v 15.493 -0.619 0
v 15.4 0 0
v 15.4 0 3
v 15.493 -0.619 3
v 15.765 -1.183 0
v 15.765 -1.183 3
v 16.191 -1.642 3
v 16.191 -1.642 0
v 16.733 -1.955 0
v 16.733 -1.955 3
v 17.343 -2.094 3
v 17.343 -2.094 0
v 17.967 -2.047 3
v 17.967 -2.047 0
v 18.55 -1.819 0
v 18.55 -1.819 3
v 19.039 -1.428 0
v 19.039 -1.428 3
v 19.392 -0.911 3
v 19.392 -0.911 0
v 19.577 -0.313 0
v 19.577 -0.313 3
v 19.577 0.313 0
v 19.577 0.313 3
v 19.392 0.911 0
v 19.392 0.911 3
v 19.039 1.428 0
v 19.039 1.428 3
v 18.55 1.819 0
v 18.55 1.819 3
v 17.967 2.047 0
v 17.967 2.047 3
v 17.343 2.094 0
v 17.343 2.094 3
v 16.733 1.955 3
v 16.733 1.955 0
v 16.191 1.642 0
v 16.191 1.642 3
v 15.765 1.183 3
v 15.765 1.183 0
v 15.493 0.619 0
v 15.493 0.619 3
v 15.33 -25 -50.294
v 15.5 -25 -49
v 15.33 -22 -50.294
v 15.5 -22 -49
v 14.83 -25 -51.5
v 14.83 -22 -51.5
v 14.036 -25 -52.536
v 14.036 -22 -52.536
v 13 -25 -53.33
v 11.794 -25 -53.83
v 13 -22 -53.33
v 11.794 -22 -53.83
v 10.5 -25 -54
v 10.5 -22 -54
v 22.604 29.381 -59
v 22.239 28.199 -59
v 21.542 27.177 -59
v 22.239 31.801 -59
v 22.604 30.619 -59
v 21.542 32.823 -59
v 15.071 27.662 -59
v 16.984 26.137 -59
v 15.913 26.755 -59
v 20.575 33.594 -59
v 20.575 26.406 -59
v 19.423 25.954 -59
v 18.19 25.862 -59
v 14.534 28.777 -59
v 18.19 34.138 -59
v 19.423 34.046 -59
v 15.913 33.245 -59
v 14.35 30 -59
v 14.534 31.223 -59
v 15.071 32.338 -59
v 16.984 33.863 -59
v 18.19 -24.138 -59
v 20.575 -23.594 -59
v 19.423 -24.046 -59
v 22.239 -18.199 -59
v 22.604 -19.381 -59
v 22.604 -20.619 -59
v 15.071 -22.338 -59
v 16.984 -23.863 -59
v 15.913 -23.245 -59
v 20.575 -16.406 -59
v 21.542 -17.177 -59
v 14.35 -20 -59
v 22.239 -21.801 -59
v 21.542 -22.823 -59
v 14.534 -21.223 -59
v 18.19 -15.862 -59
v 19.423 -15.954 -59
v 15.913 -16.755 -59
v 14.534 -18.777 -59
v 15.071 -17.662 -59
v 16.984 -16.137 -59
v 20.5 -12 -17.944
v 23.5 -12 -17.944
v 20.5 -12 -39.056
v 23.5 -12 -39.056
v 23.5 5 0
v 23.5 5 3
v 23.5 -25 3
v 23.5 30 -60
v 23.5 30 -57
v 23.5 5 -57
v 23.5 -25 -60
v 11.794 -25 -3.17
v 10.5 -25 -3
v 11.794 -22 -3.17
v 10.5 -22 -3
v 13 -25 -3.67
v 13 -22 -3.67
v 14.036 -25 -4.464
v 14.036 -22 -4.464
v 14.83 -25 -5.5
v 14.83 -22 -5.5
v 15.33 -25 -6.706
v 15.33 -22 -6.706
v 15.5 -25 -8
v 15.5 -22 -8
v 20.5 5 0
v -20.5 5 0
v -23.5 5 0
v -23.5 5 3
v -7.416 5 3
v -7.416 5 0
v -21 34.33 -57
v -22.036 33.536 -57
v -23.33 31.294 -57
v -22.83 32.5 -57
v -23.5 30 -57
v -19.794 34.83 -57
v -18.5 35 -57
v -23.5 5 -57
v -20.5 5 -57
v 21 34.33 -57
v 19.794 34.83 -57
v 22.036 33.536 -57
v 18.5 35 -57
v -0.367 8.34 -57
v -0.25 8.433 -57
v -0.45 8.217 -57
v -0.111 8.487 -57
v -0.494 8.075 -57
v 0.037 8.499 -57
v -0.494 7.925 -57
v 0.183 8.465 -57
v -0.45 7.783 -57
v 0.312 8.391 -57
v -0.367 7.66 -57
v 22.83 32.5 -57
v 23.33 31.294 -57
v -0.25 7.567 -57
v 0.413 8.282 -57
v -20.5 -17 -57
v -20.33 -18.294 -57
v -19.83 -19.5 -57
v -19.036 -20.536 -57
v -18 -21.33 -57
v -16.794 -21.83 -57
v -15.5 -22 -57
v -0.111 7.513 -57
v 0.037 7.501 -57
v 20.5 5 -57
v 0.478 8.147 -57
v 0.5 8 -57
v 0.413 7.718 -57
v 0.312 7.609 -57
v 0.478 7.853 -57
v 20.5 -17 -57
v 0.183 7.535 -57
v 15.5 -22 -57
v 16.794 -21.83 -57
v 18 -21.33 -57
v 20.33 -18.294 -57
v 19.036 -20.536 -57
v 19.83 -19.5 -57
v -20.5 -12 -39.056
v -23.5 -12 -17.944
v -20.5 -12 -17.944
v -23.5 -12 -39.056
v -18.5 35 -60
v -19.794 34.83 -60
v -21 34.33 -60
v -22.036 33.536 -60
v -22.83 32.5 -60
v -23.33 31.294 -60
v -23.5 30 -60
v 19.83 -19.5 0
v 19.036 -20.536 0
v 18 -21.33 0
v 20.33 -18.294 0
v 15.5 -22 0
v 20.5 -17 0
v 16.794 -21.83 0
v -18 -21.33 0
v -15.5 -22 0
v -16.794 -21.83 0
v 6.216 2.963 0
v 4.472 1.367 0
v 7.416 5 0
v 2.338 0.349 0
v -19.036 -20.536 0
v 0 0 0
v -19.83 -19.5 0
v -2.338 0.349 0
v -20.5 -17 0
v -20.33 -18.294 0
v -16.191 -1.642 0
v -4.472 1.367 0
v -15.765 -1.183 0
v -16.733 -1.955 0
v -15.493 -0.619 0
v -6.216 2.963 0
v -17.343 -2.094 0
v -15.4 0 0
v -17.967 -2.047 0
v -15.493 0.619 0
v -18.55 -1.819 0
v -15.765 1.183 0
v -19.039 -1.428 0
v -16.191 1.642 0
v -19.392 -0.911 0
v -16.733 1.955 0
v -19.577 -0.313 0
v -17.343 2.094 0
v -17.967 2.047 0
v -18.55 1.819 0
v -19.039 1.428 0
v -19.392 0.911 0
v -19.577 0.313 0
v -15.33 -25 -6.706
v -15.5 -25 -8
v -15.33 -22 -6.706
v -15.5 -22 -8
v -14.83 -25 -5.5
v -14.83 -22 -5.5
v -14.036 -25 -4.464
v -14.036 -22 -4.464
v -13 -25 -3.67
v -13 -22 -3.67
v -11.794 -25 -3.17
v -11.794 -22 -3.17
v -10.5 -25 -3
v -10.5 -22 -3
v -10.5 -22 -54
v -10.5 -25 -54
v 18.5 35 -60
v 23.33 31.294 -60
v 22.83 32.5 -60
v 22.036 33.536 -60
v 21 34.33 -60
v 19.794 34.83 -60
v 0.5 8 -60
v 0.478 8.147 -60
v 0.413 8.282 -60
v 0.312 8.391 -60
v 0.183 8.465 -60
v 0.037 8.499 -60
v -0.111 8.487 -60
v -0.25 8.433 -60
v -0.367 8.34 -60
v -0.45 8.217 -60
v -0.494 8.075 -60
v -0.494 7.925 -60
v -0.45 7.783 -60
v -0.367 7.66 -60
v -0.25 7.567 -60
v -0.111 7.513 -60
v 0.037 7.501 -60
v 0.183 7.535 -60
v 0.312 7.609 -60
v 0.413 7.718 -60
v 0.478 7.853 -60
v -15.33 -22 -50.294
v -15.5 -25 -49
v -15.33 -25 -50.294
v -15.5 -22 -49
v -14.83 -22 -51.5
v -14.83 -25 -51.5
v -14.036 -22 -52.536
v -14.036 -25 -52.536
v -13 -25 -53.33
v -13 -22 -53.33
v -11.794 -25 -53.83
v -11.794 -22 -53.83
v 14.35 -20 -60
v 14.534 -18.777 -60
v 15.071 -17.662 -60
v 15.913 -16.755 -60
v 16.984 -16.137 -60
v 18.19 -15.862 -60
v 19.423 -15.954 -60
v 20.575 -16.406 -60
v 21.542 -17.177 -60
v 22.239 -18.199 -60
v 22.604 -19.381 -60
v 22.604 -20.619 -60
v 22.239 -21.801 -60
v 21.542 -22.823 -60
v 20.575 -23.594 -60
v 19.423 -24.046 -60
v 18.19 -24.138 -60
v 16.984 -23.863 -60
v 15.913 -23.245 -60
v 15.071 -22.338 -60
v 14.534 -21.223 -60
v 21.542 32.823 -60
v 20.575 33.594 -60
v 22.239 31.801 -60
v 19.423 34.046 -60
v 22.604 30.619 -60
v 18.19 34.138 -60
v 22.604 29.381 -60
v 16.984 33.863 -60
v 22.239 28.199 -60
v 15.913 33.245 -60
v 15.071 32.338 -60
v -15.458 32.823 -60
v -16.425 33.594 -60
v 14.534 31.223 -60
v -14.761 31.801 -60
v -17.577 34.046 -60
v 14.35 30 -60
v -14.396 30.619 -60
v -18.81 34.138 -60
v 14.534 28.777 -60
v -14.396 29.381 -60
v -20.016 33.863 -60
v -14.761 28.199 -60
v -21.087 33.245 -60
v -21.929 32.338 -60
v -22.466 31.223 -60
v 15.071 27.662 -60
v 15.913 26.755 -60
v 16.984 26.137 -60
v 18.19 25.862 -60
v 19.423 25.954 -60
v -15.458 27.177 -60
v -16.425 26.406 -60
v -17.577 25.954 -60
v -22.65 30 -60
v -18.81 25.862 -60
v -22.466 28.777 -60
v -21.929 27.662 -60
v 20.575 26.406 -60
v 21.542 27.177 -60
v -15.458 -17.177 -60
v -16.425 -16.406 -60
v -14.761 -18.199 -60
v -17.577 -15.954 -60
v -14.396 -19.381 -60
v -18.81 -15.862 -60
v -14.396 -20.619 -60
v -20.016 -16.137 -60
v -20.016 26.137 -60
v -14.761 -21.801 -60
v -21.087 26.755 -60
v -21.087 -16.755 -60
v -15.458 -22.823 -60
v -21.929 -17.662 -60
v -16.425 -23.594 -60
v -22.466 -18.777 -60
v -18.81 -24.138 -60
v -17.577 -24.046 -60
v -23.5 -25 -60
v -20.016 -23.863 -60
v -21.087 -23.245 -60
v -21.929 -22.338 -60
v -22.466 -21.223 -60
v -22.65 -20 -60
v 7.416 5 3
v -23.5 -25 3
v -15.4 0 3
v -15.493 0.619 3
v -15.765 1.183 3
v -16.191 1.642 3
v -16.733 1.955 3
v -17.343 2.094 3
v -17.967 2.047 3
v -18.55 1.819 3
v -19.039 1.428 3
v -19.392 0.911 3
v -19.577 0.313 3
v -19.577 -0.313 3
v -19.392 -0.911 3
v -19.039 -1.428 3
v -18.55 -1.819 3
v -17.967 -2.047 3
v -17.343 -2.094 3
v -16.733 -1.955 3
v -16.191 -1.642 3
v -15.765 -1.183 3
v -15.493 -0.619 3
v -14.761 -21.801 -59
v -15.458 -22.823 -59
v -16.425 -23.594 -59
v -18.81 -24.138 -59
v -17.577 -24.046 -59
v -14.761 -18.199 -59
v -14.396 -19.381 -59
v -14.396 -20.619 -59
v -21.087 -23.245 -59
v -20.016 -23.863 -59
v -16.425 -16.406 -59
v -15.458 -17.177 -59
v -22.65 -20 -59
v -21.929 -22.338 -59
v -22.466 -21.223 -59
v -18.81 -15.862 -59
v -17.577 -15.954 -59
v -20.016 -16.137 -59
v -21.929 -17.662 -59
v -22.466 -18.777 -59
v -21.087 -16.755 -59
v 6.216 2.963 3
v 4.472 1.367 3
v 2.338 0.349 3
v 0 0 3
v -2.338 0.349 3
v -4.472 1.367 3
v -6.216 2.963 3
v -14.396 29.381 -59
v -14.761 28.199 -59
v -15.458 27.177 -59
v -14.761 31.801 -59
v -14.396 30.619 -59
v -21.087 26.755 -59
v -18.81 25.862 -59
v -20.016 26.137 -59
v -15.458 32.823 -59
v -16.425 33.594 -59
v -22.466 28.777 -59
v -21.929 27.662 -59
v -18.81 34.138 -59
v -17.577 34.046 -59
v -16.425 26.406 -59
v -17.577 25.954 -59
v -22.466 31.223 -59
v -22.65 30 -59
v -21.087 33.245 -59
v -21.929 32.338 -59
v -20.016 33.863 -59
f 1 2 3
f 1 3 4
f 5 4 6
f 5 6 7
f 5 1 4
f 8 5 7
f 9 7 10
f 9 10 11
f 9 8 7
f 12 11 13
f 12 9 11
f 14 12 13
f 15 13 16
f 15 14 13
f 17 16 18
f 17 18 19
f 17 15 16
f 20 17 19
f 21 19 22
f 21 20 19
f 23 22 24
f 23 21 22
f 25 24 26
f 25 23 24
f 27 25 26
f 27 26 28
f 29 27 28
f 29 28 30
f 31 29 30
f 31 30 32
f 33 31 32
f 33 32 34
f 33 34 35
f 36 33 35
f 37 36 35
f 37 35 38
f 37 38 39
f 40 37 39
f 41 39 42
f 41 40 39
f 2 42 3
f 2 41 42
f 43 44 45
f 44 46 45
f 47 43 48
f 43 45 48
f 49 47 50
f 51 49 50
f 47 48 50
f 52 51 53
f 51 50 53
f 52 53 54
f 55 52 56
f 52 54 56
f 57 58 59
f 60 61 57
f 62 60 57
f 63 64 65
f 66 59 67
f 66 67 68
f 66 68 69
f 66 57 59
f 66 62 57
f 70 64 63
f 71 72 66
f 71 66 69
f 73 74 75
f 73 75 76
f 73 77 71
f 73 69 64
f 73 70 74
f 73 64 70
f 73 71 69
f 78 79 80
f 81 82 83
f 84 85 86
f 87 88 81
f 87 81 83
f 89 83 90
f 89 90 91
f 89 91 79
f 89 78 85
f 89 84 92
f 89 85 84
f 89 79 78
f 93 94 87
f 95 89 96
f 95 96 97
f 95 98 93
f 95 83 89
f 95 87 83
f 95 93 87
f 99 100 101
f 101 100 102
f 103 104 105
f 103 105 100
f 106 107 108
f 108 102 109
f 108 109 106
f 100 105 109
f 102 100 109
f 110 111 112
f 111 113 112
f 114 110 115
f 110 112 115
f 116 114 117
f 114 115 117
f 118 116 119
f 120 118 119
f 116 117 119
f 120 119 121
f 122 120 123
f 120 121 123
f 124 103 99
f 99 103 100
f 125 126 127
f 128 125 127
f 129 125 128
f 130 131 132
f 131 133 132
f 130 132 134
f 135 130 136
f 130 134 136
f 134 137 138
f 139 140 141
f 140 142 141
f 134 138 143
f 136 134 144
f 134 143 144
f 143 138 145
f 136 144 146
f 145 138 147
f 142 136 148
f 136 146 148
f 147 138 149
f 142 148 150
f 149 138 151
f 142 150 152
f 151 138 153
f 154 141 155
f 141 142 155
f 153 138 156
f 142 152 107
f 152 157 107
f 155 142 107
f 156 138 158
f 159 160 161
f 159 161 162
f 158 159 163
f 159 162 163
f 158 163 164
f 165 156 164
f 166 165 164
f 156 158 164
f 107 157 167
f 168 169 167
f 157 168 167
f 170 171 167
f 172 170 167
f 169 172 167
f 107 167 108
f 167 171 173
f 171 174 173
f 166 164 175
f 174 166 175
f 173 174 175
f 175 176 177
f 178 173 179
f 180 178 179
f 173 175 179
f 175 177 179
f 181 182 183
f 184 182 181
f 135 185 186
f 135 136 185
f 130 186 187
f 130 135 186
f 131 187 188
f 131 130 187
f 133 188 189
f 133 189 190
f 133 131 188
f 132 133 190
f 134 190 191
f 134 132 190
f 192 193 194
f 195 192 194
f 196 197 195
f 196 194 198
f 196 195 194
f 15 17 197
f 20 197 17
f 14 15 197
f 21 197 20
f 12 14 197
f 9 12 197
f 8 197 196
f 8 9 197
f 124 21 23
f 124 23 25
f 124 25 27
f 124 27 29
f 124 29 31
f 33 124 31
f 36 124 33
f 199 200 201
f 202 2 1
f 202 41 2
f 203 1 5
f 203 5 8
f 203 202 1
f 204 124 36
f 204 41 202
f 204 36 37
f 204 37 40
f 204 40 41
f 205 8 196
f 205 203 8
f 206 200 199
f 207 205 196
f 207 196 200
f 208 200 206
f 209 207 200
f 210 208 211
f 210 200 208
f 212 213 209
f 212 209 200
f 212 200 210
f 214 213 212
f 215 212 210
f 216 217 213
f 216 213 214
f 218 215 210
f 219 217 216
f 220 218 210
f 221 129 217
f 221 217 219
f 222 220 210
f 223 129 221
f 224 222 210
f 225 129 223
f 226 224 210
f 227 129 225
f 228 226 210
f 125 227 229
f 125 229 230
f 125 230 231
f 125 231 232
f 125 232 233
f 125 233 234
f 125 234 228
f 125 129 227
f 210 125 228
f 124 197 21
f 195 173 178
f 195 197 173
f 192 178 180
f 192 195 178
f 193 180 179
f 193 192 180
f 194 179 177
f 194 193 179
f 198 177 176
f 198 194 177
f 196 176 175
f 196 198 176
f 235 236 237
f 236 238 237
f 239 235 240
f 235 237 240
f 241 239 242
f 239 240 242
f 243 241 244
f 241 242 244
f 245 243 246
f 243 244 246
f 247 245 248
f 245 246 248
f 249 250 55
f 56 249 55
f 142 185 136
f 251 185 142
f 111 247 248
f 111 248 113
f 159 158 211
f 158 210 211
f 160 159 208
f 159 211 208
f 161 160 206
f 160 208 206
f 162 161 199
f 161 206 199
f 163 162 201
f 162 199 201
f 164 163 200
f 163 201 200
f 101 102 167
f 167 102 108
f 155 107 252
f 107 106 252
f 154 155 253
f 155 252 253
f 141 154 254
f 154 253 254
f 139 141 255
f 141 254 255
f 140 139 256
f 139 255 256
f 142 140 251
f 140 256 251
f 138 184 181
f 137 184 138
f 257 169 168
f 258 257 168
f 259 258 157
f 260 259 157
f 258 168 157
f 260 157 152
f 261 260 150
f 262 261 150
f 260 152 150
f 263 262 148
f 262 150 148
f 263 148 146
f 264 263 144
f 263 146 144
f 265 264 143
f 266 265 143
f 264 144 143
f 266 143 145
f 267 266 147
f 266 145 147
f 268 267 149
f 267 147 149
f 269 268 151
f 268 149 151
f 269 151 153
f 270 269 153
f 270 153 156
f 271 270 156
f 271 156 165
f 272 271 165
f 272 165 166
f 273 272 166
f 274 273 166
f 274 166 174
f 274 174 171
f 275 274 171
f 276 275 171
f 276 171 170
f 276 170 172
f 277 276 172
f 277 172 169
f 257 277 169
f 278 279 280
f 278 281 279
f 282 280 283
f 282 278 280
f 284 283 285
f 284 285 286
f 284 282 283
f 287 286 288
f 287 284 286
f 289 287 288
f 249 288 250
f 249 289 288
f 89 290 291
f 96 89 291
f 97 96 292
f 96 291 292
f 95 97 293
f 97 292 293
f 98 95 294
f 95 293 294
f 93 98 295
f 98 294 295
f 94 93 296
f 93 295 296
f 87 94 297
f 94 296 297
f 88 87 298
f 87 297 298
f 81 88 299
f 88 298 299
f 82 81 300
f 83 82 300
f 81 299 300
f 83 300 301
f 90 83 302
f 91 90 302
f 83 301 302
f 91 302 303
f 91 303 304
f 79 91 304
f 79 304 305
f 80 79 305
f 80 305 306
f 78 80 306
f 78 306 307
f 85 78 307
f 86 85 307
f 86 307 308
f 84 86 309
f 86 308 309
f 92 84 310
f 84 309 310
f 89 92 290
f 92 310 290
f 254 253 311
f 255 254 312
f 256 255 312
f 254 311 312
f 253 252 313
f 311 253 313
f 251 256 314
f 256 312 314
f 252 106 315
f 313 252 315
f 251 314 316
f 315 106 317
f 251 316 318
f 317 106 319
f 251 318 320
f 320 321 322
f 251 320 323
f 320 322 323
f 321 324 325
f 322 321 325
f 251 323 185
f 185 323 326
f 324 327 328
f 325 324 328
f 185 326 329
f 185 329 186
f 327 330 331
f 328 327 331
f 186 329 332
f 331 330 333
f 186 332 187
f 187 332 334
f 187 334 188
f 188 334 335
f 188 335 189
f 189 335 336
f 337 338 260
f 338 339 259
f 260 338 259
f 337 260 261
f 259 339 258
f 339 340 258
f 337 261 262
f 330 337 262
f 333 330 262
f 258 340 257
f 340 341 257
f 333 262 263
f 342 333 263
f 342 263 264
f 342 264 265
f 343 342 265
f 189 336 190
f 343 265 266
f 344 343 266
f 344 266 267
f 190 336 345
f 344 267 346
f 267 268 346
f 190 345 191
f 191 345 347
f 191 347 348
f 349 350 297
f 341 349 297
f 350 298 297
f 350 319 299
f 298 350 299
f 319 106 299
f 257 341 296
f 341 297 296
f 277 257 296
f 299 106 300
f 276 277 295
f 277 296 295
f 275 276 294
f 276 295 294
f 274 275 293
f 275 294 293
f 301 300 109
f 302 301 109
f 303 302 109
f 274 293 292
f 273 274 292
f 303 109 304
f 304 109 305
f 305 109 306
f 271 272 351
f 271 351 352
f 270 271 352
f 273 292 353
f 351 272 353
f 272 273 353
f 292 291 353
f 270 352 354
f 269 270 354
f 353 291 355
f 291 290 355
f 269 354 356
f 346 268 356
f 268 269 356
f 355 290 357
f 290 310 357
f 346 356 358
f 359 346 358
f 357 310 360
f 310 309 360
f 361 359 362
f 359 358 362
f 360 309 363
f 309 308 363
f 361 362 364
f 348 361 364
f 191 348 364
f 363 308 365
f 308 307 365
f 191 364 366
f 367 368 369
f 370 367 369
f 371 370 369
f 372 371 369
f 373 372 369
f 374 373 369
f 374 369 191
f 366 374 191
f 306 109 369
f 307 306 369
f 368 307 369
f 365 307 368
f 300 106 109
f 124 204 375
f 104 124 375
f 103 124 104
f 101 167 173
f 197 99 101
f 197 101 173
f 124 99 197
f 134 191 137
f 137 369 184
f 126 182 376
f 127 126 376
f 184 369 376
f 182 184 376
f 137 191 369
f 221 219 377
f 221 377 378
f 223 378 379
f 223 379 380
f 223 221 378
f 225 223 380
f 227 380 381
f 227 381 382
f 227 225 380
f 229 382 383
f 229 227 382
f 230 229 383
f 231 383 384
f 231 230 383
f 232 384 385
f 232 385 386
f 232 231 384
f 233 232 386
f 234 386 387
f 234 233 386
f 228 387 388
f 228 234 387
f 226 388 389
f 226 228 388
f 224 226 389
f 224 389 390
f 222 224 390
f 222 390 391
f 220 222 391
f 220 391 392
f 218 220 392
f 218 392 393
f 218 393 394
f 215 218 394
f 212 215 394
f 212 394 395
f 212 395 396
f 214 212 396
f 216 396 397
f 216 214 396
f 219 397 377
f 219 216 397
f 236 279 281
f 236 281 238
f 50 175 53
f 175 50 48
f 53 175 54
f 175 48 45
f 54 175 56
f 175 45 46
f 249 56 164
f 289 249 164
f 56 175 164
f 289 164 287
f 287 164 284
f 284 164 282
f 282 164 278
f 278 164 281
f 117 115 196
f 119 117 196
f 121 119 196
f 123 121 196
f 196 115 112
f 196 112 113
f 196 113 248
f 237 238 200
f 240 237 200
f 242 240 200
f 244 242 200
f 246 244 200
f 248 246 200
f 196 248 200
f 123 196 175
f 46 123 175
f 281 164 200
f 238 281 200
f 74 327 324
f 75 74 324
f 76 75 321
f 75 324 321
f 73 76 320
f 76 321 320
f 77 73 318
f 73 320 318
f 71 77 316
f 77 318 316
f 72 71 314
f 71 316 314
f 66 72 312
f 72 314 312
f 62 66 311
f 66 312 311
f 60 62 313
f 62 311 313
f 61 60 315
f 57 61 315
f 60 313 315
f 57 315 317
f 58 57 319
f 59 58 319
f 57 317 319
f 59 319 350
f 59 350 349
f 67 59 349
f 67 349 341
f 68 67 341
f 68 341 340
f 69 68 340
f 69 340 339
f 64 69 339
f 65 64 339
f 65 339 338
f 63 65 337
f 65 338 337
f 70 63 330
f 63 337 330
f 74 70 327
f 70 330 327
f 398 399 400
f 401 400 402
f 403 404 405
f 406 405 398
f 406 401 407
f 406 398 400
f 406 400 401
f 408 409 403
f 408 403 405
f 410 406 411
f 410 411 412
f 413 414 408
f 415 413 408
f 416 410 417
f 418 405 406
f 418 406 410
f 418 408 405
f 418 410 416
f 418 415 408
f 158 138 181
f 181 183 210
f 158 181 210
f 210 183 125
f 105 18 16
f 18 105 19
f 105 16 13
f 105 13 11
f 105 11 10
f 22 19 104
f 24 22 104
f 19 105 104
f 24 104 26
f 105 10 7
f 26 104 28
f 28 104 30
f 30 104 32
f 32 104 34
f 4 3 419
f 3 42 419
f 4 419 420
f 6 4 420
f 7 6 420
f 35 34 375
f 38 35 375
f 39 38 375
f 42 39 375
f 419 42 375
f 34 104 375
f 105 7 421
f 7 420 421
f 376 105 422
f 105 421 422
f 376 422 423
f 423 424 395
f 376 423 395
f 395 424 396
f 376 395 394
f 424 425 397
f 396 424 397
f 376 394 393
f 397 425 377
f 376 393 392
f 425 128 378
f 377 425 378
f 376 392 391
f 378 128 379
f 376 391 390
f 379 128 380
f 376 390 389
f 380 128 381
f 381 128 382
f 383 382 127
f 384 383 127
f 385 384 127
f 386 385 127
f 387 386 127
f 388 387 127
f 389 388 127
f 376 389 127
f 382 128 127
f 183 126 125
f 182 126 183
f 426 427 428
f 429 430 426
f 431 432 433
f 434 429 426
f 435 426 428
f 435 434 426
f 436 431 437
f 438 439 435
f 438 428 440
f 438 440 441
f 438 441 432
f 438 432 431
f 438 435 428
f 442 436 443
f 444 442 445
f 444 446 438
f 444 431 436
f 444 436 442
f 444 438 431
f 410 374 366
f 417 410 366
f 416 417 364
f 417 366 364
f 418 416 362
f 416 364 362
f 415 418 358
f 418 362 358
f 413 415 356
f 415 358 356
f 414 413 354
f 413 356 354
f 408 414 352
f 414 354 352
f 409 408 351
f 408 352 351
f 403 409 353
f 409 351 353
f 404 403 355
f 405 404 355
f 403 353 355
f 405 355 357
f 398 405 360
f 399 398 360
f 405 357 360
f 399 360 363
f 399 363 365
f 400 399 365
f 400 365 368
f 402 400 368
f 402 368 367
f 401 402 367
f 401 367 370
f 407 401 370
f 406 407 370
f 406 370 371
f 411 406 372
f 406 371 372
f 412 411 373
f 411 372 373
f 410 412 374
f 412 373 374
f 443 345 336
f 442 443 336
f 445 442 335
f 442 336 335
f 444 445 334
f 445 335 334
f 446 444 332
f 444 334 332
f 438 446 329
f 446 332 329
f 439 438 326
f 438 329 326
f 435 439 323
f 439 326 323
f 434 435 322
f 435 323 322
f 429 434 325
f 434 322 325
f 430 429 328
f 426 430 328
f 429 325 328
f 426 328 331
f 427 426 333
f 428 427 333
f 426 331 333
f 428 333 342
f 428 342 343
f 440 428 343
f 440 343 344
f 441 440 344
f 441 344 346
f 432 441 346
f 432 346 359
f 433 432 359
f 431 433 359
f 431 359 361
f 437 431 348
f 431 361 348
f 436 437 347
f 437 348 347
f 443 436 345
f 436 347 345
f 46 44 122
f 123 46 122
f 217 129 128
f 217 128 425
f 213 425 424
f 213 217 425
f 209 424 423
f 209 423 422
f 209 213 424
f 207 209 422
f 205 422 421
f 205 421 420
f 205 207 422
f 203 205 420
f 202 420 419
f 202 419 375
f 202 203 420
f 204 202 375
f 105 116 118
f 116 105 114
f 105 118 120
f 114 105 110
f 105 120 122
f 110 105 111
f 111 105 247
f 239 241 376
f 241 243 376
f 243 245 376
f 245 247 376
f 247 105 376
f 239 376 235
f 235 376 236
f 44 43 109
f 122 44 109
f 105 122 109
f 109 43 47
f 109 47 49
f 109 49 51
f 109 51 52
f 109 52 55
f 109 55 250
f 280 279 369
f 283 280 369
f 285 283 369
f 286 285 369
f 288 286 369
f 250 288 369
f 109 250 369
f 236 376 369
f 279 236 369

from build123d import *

# Parameters (mm, degrees)
SKETCH1_R           = 2.1
BOSS_EXTRUDE1_DEPTH = 3
EXTRUDE_THIN1_DEPTH = 47
BOSS_EXTRUDE2_DEPTH = 3
SKETCH4_W           = 31
SKETCH4_H           = 51
CUT_EXTRUDE1_DEPTH  = 72.0791812
FILLET3_R           = 5
BOSS_EXTRUDE3_DEPTH = 30
FILLET1_R           = 5
CUT_EXTRUDE3_REACH  = 75.33
SKETCH10_R          = 0.5
SKETCH11_R          = 4.15
CUT_EXTRUDE4_DEPTH  = 1
FILLET2_R           = 5


with BuildPart() as part:
    # Sketch1 → Boss-Extrude1 (new body)
    with BuildSketch(Plane.XY):
        with BuildLine():
            Line((7.416198487, 5), (23.5, 5))
            Line((23.5, 5), (23.5, -25))
            Line((23.5, -25), (-23.5, -25))
            Line((-23.5, -25), (-23.5, 5))
            Line((-23.5, 5), (-7.416198487, 5))
            ThreePointArc((-7.416198487, 5), (0, 0), (7.416198487, 5))
        make_face()
        with Locations((-17.5, 0)):
            Circle(SKETCH1_R, mode=Mode.SUBTRACT)
        with Locations(Location((17.5, 0, 0), (0, 0, 180))):
            Circle(SKETCH1_R, mode=Mode.SUBTRACT)
    extrude(amount=BOSS_EXTRUDE1_DEPTH)

    # Sketch2 → Extrude-Thin1 (add)
    with BuildSketch(Plane.ZY.offset(23.5)):
        Polygon((0, -25), (-60, -25), (-60, 5), (-57, 5), (-57, -22), (0, -22), align=None)
    extrude(amount=-EXTRUDE_THIN1_DEPTH)

    # Sketch3 → Boss-Extrude2 (add)
    with BuildSketch(Plane.ZY.offset(23.5)):
        Polygon((-57, 5), (-57, -22), (0, -22), (0, 5), (-17.944444444, -12), (-39.055555556, -12), align=None)
    boss_extrude2 = extrude(amount=-BOSS_EXTRUDE2_DEPTH)

    # Mirror1: Boss-Extrude2 across plane
    add(boss_extrude2.mirror(Plane(origin=(0, 0, 0), x_dir=(0, 0, 1), z_dir=(1, 0, 0))))

    # Sketch4 → Cut-Extrude1 (cut, through all)
    with BuildSketch(Plane.XZ.offset(25)):
        with Locations((0, -28.5)):
            Rectangle(SKETCH4_W, SKETCH4_H)
    extrude(amount=-CUT_EXTRUDE1_DEPTH, mode=Mode.SUBTRACT)

    # Fillet3
    fillet3_edges = [part.edges().sort_by_distance(p)[0] for p in [
        (15.5, -23.5, -3),
        (15.5, -23.5, -54),
        (-15.5, -23.5, -54),
        (-15.5, -23.5, -3),
    ]]
    fillet(fillet3_edges, radius=FILLET3_R)

    # Sketch6 → Boss-Extrude3 (add)
    with BuildSketch(Plane(origin=(0, 5, 0), x_dir=(1, 0, 0), z_dir=(0, 1, 0))):
        Polygon((20.5, 57), (23.5, 57), (23.5, 60), (-23.5, 60), (-23.5, 57), (-20.5, 57), align=None)
    extrude(amount=BOSS_EXTRUDE3_DEPTH)

    # Fillet1
    fillet1_edges = [part.edges().sort_by_distance(p)[0] for p in [
        (-20.5, -22, -28.5),
        (20.5, -22, -28.5),
    ]]
    fillet(fillet1_edges, radius=FILLET1_R - 0.0001)  # a hair under: the kernel refuses the full size

    # Sketch10 → Cut-Extrude3 (cut, up to next)
    with BuildSketch(Plane.XY.offset(-57), mode=Mode.PRIVATE) as cut_extrude3_sk1:
        with Locations((0, 8)):
            Circle(SKETCH10_R)
    cut_extrude3_tool1 = extrude(cut_extrude3_sk1.sketch, amount=-CUT_EXTRUDE3_REACH, mode=Mode.PRIVATE) & part.part
    add(cut_extrude3_tool1.solids().sort_by_distance((0, 8, -57))[0], mode=Mode.SUBTRACT)

    # Sketch11 → Cut-Extrude4 (cut)
    with BuildSketch(Plane(origin=(0, 0, -60), x_dir=(-1, 0, 0), z_dir=(0, 0, -1))):
        with Locations((-18.5, 30)):
            Circle(SKETCH11_R)
        with Locations((18.5, 30)):
            Circle(SKETCH11_R)
        with Locations((-18.5, -20)):
            Circle(SKETCH11_R)
        with Locations((18.5, -20)):
            Circle(SKETCH11_R)
    extrude(amount=-CUT_EXTRUDE4_DEPTH, mode=Mode.SUBTRACT)

    # Fillet2
    fillet2_edges = [part.edges().sort_by_distance(p)[0] for p in [
        (23.5, 35, -58.5),
        (-23.5, 35, -58.5),
    ]]
    fillet(fillet2_edges, radius=FILLET2_R)


solid = part.part
